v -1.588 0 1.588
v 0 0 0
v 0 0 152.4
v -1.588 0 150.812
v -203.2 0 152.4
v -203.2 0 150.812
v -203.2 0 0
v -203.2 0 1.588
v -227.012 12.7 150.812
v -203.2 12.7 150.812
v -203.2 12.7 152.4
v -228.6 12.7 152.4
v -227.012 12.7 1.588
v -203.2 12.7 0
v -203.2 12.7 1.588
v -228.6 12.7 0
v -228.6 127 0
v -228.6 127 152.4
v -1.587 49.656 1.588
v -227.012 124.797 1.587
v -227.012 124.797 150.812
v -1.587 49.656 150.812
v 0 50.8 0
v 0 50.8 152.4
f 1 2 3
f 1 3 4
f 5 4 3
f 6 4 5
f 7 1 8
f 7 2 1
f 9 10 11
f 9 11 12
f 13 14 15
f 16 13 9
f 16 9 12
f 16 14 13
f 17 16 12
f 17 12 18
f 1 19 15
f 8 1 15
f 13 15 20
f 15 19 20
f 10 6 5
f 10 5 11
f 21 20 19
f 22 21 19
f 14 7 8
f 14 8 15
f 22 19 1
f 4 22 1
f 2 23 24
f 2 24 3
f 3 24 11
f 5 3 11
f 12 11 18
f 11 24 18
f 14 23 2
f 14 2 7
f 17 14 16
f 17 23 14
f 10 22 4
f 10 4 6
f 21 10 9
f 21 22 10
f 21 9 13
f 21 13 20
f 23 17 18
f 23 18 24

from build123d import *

# Parameters (mm, degrees)
BOSS_EXTRUDE2_DEPTH = 152.4
SHELL1_T            = -1.5875
SKETCH4_W           = 25.4
SKETCH4_H           = 12.7
CUT_EXTRUDE1_DEPTH  = 152.4


with BuildPart() as part:
    # Sketch3 → Boss-Extrude2 (new body)
    with BuildSketch(Plane.XY):
        Polygon((-228.6, 127), (0, 50.8), (0, 0), (-228.6, 0), align=None)
    extrude(amount=BOSS_EXTRUDE2_DEPTH)

    # Shell1
    shell1_openings = [part.faces().sort_by_distance(p)[0] for p in [
        (-114.3, 0, 76.2),
    ]]
    offset(amount=SHELL1_T, openings=shell1_openings, kind=Kind.INTERSECTION)

    # Sketch4 → Cut-Extrude1 (cut)
    with BuildSketch(Plane(origin=(0, 0, 0), x_dir=(-1, 0, 0), z_dir=(0, 0, -1))):
        with Locations((215.9, 6.35)):
            Rectangle(SKETCH4_W, SKETCH4_H)
    extrude(amount=-CUT_EXTRUDE1_DEPTH, mode=Mode.SUBTRACT)


solid = part.part
